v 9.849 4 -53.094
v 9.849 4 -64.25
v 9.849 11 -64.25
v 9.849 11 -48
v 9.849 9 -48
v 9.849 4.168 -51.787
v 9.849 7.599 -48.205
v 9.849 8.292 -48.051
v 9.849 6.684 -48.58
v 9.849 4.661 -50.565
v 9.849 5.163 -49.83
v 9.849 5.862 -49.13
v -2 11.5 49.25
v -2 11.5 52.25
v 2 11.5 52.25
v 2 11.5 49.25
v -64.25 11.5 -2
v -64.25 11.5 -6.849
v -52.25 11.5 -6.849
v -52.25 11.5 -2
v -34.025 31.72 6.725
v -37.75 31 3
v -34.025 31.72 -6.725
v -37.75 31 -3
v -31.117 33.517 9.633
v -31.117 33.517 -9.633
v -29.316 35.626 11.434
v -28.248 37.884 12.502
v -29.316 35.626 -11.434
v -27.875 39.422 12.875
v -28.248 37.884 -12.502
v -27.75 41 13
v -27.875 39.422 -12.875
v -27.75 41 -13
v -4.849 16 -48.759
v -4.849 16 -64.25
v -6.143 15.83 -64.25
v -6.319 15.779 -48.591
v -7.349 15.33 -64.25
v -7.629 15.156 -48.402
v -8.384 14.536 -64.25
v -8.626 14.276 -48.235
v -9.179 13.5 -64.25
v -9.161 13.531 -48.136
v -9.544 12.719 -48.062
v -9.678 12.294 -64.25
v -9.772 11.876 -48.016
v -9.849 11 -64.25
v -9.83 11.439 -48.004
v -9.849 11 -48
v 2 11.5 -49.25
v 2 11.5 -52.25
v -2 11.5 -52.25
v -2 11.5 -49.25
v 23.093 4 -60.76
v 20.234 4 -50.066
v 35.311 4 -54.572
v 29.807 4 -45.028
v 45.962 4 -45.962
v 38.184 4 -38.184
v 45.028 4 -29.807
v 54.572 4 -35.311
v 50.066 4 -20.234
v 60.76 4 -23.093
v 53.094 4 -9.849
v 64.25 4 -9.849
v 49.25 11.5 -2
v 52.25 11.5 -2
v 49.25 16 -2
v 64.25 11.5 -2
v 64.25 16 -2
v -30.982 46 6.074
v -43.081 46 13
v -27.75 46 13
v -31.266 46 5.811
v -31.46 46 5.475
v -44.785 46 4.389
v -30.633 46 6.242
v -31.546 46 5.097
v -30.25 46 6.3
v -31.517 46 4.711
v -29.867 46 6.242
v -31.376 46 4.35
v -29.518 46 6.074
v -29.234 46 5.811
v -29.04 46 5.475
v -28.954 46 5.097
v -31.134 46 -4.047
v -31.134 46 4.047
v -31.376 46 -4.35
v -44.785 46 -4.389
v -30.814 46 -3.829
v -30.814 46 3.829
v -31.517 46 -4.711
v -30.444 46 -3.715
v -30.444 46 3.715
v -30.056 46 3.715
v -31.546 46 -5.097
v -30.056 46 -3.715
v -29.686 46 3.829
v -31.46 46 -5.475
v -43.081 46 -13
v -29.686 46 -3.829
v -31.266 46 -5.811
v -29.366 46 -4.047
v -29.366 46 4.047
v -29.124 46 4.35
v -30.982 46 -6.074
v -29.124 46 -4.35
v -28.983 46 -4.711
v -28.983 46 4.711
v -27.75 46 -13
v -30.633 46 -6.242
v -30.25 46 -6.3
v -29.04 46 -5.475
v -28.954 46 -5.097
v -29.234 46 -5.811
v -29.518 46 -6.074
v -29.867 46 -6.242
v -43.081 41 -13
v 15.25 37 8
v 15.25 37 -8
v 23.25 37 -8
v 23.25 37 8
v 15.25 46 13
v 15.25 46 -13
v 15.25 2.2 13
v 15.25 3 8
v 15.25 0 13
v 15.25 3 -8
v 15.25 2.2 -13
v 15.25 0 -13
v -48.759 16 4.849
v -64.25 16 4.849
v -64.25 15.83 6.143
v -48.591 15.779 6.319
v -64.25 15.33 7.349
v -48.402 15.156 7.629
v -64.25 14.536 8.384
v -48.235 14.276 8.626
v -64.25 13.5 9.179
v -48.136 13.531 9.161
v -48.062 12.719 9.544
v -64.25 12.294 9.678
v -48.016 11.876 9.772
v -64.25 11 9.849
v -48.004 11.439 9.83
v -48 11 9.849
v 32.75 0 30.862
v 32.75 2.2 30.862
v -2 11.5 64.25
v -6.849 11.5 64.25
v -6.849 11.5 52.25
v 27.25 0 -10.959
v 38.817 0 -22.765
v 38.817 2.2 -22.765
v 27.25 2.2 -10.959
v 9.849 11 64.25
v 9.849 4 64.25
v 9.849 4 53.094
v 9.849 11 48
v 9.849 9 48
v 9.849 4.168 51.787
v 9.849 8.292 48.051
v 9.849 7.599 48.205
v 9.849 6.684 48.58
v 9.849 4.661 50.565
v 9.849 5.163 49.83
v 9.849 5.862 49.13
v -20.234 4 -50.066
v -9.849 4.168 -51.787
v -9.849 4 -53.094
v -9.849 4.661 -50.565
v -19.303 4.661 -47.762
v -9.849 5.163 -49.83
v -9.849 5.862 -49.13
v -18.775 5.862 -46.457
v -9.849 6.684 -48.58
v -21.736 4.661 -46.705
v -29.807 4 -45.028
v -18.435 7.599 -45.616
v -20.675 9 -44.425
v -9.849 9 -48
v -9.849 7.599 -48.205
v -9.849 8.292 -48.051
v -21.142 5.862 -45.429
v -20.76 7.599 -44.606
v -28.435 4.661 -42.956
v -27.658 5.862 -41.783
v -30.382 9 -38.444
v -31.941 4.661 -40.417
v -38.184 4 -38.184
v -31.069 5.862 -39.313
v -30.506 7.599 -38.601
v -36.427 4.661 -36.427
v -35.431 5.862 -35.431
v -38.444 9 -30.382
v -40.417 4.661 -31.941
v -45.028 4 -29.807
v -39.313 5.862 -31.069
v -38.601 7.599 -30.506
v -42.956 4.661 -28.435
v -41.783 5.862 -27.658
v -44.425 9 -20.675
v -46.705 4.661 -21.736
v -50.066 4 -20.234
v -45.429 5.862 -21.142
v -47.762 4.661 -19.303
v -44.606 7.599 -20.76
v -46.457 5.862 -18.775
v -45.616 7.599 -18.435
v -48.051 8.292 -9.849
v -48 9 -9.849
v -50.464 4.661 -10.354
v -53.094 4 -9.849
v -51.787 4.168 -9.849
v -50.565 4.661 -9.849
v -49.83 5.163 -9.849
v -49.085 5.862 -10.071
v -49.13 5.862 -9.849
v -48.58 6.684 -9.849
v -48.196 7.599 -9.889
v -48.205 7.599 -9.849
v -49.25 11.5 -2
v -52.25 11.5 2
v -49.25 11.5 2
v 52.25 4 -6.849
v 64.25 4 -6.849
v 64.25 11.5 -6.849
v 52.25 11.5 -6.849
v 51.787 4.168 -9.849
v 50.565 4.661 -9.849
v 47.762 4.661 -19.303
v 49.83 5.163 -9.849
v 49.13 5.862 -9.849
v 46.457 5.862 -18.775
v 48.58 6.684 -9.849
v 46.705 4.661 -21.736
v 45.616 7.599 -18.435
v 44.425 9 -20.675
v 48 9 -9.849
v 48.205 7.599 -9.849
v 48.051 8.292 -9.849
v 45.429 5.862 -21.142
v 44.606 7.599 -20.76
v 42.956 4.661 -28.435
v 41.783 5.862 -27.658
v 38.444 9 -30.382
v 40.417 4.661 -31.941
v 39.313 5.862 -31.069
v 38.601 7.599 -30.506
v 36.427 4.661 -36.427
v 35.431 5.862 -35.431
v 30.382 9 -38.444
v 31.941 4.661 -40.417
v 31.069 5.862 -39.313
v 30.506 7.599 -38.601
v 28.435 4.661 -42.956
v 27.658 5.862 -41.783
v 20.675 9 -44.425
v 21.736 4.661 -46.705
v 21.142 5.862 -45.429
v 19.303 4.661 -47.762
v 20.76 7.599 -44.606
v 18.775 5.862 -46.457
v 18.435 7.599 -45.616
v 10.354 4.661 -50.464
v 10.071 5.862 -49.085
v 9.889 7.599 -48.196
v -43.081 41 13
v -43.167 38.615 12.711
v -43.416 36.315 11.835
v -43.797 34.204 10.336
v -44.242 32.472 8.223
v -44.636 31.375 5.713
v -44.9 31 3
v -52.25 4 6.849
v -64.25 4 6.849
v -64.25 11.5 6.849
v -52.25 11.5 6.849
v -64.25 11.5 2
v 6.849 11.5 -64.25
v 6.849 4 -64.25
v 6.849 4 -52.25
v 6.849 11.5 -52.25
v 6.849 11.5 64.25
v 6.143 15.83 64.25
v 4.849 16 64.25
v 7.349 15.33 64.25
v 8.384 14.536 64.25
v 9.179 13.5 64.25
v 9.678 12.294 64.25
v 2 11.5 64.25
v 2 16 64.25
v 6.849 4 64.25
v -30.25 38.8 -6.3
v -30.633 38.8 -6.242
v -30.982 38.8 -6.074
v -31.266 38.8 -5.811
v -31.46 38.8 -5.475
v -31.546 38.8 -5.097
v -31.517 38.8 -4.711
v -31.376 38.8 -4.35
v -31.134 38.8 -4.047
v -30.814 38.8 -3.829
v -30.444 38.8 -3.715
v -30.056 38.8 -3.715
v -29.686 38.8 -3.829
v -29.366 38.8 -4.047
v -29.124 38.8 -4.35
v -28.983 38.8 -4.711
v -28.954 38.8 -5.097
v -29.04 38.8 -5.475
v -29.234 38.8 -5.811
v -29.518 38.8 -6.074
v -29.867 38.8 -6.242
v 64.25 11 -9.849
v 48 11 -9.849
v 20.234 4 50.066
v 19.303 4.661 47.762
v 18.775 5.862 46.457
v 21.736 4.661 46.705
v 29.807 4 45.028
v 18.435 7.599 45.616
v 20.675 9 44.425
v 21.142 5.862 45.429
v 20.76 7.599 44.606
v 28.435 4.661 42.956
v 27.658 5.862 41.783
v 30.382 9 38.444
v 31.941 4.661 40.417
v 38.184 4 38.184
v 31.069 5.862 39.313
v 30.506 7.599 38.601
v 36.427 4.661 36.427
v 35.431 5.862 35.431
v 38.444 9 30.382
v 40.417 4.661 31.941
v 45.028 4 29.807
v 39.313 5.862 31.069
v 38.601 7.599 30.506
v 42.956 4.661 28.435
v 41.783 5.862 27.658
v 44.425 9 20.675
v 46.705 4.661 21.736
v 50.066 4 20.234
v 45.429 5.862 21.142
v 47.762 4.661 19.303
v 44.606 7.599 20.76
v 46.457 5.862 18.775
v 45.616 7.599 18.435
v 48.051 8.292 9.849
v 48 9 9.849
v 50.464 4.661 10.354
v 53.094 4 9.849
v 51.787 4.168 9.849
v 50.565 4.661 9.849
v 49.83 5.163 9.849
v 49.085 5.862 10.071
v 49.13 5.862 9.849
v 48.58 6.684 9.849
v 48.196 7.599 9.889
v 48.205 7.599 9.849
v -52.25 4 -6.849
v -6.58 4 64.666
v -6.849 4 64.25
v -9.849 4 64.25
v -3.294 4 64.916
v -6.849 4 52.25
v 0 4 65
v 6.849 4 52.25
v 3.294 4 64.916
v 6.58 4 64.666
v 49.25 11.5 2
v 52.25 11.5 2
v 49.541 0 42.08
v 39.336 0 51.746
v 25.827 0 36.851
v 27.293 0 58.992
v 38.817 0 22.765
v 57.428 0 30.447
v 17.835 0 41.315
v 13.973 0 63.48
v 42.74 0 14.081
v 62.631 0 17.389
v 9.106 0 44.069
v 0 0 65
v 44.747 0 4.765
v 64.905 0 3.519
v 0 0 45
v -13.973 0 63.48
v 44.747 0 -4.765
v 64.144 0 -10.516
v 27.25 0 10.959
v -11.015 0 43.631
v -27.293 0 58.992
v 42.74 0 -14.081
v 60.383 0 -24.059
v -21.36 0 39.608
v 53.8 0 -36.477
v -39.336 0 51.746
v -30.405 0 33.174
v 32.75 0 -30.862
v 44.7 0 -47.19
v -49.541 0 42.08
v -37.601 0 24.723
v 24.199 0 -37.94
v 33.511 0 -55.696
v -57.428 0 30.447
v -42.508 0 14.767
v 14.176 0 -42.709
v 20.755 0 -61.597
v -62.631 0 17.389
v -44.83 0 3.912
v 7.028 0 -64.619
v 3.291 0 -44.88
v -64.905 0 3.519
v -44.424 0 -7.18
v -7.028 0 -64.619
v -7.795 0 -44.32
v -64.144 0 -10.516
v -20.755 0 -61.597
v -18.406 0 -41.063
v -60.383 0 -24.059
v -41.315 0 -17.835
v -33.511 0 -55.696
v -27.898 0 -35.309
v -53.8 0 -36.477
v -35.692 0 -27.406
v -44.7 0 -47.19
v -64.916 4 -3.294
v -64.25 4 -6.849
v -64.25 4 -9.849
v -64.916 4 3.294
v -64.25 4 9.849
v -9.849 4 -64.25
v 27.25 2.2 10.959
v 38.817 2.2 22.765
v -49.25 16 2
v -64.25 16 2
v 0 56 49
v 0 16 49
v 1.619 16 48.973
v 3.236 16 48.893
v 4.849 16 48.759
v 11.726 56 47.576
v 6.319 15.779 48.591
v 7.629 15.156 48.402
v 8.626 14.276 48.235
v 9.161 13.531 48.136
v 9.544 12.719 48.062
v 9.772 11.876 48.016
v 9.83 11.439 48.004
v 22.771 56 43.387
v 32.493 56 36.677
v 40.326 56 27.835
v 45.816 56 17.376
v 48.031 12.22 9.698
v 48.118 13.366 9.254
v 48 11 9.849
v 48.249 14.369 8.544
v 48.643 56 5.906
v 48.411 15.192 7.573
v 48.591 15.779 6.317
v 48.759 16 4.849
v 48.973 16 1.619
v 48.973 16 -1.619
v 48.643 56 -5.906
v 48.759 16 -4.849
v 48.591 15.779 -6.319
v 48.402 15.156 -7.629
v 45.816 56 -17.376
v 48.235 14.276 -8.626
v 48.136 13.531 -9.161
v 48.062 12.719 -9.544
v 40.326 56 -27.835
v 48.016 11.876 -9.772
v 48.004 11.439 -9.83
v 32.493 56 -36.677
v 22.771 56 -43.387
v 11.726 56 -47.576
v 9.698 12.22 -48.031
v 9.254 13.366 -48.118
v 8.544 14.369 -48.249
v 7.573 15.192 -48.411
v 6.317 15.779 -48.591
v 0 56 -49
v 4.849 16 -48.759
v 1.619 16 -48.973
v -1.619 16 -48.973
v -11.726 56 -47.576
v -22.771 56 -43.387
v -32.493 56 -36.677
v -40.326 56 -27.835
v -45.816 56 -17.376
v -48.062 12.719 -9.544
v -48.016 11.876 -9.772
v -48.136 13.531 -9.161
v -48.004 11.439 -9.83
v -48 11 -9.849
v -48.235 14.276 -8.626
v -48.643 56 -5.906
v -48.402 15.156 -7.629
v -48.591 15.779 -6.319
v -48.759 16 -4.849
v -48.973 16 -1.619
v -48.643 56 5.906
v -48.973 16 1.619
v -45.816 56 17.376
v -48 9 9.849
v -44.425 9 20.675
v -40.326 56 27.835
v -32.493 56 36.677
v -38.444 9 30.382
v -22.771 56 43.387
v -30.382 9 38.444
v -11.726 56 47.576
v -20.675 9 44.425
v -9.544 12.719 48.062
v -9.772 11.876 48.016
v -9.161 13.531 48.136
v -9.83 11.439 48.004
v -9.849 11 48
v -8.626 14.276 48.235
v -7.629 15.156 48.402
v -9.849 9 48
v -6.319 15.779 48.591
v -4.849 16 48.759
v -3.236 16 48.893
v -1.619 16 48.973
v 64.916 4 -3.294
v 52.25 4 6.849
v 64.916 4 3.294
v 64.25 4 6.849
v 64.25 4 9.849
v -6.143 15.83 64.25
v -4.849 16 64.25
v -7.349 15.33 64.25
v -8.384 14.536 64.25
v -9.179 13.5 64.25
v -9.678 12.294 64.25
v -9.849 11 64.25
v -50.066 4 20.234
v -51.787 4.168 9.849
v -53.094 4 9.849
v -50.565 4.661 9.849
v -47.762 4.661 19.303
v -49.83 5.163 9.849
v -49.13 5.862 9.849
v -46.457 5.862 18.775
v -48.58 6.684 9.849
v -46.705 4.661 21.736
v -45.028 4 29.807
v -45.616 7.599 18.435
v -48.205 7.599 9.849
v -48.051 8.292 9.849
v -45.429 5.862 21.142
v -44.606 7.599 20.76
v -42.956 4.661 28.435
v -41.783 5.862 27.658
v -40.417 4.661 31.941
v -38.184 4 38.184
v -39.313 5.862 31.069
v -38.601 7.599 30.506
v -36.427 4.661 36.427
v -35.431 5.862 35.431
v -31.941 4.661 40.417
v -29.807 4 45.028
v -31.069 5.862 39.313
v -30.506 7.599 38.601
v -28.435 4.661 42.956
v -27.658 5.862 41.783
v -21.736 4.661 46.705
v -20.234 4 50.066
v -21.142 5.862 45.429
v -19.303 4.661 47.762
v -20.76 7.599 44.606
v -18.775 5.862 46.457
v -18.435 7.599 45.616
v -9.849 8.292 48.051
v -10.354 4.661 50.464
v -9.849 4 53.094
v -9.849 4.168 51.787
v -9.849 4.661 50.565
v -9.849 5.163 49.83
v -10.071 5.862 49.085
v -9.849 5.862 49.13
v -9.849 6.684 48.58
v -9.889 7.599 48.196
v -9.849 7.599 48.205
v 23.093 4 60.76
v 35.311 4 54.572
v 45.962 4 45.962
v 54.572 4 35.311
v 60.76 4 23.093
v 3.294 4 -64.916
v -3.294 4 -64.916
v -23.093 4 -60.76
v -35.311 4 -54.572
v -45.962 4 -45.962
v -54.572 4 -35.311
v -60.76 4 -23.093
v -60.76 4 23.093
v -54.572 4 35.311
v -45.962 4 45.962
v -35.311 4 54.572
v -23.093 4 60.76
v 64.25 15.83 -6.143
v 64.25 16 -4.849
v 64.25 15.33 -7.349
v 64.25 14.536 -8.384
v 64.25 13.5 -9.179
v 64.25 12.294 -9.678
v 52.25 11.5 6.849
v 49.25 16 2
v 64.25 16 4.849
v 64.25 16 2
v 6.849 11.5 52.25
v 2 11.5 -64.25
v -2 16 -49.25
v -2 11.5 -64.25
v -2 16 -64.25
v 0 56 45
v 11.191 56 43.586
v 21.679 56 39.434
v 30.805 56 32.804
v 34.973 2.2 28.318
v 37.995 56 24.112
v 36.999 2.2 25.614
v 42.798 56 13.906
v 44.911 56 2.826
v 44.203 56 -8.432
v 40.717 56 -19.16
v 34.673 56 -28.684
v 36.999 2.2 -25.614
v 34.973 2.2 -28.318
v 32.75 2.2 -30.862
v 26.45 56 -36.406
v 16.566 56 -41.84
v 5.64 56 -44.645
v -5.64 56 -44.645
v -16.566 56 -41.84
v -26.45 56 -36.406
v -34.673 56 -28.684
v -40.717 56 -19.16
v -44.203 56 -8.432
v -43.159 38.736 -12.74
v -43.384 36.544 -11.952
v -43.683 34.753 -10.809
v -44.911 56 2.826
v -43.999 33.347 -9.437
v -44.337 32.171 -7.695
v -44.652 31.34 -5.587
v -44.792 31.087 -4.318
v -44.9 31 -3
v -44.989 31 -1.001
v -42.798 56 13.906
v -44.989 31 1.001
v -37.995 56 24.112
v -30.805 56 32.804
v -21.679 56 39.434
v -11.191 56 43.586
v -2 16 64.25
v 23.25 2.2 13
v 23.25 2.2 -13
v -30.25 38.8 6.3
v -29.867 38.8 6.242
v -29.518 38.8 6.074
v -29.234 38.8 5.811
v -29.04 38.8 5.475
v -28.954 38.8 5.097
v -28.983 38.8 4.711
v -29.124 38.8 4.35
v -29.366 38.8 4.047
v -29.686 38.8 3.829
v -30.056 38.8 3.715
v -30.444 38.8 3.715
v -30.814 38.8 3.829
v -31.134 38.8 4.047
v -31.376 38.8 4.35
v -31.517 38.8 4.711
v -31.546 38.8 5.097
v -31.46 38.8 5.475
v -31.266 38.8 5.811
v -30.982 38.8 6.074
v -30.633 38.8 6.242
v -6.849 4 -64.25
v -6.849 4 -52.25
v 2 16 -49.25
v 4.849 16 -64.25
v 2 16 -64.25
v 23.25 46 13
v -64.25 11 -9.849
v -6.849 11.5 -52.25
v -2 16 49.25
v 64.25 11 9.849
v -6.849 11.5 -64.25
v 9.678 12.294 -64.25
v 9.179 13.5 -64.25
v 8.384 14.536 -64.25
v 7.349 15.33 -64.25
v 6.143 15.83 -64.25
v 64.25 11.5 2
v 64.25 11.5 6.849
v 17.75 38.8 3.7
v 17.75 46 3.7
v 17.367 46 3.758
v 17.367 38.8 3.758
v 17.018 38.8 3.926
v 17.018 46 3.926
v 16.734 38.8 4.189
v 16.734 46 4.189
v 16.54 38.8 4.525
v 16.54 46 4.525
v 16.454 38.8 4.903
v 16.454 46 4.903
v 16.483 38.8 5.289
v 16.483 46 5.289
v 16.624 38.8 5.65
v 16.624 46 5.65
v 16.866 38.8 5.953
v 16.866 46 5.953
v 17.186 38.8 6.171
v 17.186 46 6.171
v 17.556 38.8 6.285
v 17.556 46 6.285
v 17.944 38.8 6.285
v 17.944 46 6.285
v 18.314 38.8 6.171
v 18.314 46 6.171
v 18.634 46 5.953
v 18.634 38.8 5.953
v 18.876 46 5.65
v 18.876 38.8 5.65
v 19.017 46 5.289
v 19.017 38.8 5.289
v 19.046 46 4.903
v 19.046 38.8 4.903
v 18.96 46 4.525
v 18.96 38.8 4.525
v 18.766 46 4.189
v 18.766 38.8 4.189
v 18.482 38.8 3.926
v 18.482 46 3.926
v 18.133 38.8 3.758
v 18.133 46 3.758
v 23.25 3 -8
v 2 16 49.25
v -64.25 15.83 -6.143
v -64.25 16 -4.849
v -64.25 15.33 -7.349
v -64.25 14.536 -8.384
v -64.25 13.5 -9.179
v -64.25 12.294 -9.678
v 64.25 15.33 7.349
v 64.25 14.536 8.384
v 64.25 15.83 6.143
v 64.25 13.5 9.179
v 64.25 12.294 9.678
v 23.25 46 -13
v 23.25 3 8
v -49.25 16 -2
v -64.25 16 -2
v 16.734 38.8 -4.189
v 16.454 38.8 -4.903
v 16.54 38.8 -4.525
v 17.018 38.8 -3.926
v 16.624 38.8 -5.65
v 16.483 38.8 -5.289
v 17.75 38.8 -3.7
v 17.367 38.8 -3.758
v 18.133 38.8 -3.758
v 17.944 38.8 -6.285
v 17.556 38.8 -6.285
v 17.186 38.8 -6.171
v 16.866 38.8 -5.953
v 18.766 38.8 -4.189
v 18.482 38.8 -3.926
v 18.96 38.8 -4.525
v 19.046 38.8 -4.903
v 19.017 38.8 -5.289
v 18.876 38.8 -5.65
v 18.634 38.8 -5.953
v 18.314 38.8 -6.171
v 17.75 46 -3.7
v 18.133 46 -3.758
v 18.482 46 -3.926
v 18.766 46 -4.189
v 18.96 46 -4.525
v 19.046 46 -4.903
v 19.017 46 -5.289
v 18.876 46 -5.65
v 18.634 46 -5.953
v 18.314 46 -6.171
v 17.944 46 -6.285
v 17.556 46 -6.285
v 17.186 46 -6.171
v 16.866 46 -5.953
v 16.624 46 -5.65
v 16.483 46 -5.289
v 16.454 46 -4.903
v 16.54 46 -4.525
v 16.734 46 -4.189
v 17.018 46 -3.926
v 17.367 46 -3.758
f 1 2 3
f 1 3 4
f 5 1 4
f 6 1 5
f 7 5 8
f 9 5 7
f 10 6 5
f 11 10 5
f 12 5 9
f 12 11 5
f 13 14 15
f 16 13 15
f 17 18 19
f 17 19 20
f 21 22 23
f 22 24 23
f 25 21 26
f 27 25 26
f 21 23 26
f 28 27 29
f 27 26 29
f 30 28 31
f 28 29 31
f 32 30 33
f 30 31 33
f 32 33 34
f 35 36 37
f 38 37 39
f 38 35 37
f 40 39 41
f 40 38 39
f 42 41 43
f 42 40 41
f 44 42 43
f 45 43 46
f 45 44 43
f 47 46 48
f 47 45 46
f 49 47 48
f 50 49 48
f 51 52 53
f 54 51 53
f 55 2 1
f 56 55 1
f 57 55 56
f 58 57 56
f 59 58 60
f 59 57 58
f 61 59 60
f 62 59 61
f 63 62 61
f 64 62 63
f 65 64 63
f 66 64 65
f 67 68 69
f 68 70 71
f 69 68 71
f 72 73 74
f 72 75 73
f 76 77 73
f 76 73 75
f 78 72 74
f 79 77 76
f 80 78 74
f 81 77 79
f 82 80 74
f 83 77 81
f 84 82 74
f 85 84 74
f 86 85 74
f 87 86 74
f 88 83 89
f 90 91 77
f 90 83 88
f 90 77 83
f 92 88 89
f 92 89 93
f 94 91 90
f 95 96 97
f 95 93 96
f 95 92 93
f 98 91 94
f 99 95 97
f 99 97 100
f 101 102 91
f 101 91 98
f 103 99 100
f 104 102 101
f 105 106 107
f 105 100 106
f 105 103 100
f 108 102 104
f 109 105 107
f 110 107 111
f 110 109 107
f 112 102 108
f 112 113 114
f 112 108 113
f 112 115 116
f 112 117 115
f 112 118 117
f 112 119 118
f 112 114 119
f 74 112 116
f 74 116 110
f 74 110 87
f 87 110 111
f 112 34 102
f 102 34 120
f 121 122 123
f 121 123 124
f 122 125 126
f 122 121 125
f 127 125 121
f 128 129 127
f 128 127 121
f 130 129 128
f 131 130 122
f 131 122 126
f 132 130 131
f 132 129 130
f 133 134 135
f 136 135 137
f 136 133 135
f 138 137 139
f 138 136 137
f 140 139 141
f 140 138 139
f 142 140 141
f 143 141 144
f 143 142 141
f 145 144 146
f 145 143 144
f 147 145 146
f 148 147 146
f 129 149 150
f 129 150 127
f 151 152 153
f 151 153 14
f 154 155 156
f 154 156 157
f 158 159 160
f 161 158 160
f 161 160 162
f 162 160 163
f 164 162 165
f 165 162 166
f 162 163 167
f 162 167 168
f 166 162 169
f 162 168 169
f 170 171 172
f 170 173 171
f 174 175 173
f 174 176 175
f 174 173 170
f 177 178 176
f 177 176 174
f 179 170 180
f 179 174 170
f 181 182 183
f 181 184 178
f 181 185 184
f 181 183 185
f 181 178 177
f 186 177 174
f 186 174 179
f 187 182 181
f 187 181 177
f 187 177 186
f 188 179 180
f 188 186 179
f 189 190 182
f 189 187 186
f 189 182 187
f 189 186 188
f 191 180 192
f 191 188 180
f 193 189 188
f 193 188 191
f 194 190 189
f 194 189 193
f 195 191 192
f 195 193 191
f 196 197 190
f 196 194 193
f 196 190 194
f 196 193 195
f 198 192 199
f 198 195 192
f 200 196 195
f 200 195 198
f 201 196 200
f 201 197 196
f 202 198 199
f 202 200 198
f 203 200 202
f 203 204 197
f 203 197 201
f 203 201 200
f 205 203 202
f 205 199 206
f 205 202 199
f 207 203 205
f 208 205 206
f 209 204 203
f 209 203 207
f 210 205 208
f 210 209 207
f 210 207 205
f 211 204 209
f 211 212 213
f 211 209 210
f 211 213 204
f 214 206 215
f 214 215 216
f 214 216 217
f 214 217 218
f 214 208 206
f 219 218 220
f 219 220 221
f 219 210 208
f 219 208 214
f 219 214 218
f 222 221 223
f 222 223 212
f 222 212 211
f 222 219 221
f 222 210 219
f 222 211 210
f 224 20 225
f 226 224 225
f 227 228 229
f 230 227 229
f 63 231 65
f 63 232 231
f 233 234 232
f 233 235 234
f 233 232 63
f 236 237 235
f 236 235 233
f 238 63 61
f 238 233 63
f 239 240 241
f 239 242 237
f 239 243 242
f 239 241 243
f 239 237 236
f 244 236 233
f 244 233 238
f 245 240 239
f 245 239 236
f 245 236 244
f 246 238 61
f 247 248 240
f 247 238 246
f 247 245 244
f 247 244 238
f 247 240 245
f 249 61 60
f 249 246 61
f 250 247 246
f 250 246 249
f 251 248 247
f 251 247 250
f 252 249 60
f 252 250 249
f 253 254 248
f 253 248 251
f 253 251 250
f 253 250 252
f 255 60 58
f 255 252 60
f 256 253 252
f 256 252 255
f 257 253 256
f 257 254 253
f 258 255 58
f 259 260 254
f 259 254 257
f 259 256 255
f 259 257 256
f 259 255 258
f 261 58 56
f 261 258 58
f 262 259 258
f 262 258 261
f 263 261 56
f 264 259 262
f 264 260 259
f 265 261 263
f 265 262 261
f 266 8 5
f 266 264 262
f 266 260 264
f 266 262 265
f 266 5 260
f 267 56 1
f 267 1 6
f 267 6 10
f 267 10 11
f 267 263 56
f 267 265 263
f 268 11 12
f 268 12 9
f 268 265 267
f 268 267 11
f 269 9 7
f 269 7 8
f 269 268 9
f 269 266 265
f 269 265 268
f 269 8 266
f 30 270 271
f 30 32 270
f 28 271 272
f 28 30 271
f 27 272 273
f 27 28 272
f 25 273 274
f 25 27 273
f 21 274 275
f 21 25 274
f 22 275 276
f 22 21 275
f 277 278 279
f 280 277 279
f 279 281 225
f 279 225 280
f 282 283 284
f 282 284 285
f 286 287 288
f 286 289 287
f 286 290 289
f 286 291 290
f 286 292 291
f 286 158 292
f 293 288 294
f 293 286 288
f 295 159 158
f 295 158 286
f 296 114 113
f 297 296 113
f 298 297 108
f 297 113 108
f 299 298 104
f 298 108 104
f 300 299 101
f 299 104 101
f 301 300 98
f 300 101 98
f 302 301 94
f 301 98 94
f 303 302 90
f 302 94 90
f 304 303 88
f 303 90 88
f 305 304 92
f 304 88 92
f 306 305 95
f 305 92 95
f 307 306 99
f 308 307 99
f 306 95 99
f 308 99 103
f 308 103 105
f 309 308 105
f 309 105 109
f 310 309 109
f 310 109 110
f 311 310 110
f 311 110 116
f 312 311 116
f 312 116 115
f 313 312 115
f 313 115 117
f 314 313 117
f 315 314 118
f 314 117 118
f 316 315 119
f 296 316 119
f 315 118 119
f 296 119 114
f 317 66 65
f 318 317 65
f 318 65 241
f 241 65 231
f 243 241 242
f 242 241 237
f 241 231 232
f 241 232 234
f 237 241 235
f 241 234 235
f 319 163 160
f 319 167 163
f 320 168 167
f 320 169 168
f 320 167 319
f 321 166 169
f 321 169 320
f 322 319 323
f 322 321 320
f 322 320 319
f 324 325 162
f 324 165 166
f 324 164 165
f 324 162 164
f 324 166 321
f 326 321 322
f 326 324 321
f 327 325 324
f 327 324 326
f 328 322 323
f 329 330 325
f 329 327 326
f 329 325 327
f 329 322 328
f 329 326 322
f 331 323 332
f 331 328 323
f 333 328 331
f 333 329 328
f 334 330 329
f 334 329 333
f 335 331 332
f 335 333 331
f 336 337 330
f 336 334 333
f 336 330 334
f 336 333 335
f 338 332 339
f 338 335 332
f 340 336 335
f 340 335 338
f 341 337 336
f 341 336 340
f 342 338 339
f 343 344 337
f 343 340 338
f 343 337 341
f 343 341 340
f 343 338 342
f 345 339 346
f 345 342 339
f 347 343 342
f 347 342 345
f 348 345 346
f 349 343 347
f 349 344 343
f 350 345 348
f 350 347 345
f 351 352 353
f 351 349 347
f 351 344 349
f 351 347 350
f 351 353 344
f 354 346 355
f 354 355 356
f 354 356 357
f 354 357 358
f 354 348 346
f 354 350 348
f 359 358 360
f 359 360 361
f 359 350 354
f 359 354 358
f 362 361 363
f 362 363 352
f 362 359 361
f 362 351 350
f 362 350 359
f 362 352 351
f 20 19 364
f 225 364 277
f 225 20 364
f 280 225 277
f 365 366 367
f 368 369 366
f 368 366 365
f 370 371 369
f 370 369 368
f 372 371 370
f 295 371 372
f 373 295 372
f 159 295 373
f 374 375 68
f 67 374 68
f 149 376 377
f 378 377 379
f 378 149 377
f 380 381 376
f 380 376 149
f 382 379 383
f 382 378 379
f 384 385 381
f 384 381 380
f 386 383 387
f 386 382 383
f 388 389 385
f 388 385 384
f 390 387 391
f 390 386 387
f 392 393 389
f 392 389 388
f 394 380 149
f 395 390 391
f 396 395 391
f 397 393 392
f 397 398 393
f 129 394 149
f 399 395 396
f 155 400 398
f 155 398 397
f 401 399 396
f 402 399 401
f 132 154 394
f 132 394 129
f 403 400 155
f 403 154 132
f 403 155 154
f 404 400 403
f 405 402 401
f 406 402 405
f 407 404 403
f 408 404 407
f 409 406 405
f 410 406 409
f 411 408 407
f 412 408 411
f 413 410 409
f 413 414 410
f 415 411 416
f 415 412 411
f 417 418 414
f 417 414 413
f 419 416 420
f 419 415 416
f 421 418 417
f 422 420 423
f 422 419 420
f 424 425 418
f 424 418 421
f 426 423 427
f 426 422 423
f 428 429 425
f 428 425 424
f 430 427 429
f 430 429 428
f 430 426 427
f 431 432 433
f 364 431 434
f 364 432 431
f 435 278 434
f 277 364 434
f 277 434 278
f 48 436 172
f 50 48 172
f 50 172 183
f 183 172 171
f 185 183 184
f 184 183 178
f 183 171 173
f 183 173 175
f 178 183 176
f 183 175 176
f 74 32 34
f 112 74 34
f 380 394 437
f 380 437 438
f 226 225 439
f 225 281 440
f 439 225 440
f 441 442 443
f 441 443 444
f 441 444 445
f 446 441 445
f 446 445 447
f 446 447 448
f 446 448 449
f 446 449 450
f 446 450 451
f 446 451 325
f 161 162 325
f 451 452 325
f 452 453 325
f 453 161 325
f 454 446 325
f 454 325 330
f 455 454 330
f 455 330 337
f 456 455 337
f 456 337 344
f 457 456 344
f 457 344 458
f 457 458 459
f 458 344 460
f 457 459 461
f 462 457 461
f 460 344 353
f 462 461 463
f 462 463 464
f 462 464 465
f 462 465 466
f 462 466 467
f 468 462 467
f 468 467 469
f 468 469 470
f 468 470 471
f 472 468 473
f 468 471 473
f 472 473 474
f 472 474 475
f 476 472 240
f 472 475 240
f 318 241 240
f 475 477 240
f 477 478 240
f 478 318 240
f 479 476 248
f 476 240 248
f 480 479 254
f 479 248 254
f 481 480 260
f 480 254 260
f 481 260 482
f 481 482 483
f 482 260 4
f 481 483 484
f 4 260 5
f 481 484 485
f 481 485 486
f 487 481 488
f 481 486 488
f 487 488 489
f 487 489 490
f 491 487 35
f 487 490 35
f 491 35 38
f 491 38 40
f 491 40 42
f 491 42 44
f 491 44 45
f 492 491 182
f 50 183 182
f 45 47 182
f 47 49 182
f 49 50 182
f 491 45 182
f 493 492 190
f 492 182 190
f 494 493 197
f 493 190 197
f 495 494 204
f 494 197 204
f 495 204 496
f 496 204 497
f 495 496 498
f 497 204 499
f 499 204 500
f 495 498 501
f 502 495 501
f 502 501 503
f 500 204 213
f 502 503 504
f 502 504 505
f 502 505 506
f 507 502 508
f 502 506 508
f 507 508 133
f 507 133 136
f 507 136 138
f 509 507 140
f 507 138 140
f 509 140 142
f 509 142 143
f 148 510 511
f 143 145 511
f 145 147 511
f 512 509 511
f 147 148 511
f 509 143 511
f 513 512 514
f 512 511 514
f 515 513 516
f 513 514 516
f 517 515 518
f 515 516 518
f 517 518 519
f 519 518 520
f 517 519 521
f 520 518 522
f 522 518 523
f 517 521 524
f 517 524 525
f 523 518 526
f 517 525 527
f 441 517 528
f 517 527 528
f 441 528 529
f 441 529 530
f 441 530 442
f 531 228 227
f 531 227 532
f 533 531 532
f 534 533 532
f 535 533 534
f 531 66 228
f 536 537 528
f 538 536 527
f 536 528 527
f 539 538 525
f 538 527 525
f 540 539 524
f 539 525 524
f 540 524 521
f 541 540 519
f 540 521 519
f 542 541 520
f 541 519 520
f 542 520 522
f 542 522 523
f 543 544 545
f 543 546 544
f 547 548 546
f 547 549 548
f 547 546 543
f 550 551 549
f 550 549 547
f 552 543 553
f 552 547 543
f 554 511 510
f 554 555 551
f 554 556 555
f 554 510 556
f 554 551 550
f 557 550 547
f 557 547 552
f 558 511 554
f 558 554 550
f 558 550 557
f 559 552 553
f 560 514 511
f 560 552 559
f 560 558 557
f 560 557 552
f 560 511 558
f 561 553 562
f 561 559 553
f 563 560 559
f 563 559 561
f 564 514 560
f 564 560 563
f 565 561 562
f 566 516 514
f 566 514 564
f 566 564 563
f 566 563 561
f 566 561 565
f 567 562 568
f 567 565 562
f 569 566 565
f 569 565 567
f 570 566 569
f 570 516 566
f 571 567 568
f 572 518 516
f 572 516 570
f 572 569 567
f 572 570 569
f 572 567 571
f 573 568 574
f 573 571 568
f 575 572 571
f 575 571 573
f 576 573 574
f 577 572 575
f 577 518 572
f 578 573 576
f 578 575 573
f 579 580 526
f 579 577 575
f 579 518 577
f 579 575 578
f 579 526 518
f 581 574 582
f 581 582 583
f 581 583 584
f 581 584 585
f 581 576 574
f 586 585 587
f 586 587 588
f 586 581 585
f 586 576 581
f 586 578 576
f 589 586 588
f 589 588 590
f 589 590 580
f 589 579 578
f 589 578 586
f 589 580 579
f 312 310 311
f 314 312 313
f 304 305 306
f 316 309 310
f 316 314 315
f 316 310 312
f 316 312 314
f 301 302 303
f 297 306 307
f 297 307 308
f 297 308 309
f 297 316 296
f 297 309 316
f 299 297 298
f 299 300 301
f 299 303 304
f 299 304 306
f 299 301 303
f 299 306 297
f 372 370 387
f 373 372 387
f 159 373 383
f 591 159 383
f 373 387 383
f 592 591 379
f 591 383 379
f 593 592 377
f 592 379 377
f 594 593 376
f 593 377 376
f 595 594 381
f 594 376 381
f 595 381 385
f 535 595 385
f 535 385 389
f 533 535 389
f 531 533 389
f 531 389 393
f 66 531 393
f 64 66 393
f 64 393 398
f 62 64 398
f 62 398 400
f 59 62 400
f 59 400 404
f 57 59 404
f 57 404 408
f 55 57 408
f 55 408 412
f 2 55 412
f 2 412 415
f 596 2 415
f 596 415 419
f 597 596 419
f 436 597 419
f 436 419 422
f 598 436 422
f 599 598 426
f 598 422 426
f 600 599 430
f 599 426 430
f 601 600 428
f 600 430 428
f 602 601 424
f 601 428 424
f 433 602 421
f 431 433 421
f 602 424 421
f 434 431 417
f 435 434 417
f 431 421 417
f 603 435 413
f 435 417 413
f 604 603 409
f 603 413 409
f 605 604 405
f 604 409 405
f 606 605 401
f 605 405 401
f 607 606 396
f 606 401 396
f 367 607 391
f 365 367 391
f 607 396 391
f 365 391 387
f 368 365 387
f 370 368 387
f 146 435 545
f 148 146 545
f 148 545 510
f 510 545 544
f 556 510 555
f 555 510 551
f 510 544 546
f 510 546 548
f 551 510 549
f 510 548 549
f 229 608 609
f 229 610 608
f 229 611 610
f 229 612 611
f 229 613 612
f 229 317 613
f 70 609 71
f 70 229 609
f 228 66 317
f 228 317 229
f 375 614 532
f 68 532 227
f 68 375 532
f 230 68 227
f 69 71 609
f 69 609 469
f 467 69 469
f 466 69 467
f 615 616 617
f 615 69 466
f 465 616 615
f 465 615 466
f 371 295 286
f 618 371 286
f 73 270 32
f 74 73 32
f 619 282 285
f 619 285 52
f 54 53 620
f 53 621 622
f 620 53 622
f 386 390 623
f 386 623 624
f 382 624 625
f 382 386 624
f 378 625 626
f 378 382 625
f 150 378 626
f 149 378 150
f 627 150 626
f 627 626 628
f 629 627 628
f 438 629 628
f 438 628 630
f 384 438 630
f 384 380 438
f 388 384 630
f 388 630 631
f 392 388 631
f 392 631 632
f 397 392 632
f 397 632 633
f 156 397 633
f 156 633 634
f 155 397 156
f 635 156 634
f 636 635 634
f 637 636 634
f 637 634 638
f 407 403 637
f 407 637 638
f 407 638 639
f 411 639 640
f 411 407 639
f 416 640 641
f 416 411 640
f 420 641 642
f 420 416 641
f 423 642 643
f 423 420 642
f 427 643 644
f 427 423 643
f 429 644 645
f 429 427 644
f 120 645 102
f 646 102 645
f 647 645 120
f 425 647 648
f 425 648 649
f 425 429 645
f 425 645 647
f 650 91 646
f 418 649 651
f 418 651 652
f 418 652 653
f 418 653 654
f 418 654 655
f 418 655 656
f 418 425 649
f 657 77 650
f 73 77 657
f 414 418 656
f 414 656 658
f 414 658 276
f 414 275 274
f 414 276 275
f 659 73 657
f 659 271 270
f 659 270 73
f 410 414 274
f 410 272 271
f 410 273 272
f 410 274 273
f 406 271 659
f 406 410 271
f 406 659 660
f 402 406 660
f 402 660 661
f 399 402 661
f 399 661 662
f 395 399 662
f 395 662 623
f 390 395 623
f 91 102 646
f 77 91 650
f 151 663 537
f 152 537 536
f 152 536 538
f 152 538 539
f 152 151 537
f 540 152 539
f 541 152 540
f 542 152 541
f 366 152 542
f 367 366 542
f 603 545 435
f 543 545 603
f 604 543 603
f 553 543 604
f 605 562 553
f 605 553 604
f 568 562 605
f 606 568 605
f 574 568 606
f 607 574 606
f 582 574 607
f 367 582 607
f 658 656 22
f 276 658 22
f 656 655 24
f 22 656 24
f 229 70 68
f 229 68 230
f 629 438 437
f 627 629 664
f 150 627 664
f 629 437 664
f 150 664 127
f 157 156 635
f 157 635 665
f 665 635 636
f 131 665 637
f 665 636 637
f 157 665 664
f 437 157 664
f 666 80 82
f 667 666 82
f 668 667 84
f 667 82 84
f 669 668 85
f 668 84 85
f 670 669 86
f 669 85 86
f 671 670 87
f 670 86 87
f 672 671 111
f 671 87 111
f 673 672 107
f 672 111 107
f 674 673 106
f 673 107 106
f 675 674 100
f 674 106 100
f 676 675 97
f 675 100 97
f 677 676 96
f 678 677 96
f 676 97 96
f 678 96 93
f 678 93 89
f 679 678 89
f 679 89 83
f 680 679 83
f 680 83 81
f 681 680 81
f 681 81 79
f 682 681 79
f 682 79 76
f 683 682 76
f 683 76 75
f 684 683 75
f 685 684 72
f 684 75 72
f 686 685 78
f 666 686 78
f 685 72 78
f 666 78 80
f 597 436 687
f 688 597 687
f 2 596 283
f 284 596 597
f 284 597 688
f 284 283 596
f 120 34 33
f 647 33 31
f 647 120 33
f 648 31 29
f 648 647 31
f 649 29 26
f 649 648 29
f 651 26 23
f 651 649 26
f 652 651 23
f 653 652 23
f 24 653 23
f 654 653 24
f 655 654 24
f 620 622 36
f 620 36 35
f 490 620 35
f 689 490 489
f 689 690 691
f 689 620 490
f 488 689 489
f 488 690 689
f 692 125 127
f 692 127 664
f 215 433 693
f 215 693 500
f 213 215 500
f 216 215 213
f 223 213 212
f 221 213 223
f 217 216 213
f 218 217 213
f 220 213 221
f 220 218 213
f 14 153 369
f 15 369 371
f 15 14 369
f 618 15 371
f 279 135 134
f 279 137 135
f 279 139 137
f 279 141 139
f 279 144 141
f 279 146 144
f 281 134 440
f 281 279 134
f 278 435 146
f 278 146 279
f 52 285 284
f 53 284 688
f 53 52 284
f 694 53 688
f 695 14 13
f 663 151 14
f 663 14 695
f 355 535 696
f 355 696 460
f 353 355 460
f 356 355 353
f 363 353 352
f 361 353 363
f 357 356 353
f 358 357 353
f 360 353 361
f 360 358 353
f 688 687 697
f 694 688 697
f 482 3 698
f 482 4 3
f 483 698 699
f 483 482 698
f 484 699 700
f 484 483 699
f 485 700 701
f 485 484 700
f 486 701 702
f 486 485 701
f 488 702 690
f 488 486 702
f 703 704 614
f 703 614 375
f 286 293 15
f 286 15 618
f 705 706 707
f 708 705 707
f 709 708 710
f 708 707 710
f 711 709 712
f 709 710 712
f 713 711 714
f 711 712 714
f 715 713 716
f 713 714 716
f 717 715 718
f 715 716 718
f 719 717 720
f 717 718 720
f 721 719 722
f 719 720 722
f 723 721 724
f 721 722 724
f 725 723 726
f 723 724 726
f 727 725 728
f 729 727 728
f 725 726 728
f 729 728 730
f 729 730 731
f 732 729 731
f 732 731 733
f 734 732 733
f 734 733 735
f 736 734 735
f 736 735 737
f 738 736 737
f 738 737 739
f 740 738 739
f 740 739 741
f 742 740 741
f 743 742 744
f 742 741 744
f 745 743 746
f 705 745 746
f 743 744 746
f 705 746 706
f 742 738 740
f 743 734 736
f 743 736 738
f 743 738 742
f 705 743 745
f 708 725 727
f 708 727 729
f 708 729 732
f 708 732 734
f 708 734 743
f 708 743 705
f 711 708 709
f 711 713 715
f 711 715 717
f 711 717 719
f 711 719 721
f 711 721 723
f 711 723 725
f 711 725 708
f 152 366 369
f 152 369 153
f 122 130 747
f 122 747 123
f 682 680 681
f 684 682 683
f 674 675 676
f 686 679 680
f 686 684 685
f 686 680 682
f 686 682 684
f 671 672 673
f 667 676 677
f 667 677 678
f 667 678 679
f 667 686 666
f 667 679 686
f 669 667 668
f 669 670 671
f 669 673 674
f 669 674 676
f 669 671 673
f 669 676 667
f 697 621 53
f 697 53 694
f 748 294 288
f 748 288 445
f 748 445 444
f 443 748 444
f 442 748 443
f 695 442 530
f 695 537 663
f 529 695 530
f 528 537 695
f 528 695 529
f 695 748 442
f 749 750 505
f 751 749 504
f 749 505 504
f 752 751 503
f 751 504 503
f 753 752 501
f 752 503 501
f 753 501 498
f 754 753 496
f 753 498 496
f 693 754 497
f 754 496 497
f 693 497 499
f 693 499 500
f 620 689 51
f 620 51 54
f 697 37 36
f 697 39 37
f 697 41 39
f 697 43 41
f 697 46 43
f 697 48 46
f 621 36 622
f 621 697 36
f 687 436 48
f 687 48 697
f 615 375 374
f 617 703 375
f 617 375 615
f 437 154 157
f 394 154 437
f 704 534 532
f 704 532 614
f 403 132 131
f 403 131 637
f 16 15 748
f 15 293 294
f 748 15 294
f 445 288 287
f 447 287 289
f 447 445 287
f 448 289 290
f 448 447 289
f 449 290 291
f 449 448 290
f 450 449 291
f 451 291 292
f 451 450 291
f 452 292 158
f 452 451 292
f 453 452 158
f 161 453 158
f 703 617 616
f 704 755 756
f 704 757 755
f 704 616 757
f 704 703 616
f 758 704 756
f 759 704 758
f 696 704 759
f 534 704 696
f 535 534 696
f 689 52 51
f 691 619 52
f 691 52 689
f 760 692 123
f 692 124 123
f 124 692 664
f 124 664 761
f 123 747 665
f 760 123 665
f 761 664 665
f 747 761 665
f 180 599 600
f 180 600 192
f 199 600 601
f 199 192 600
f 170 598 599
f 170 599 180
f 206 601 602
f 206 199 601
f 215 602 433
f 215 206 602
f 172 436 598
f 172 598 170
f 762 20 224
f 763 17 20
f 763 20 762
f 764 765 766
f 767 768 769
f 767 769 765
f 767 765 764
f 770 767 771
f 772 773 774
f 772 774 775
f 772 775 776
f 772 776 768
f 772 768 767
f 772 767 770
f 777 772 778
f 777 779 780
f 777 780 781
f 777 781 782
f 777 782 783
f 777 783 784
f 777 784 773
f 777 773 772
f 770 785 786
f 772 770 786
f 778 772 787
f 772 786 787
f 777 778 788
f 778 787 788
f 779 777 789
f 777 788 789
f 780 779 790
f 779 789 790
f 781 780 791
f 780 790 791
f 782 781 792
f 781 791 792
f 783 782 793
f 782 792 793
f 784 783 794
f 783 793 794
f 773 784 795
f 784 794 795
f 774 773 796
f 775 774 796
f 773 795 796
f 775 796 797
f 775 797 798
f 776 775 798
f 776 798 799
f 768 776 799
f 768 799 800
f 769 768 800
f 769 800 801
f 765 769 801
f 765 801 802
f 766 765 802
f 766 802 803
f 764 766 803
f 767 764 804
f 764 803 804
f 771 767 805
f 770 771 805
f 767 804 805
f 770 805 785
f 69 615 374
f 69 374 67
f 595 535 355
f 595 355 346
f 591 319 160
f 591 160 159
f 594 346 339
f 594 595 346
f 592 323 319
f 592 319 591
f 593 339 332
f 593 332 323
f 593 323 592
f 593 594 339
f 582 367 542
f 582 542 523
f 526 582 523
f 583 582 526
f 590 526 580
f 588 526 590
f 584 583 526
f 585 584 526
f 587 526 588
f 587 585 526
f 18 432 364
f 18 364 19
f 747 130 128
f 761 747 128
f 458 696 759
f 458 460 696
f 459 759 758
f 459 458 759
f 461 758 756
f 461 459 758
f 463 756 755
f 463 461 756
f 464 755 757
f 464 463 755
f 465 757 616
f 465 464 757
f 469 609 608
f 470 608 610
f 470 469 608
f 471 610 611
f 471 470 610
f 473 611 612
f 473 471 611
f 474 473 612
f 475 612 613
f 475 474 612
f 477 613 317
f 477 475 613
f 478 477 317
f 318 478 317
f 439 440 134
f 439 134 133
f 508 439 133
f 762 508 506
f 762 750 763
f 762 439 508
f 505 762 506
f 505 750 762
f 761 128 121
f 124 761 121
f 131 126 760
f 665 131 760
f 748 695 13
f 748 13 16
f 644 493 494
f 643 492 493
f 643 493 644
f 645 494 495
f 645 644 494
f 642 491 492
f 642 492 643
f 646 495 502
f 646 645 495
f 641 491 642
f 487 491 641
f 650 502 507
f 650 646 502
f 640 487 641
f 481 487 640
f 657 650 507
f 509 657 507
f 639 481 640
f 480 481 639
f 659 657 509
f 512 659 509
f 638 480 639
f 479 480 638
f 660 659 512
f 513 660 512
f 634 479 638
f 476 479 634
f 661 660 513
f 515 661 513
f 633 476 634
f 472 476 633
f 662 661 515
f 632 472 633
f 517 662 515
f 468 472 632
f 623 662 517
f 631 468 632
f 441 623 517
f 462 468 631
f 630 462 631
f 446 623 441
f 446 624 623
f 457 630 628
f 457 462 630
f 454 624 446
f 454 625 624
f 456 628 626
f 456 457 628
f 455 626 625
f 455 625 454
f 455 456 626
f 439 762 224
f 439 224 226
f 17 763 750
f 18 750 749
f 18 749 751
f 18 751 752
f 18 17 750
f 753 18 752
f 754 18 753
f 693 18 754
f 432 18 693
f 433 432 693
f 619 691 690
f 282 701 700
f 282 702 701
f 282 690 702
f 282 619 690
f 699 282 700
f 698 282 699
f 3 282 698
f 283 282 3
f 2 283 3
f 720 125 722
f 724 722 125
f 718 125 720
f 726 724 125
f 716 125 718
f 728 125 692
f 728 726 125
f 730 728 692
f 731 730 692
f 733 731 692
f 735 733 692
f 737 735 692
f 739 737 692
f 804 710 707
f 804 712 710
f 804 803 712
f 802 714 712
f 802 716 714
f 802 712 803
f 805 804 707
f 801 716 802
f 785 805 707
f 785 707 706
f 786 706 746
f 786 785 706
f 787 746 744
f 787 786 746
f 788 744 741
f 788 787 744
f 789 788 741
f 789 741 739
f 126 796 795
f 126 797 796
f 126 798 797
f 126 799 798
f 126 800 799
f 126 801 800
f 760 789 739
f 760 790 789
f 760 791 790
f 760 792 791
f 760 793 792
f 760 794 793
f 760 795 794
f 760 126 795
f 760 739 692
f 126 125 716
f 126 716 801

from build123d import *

# Parameters (mm, degrees)
CROQUIS1_R              = 49
CROQUIS1_R_2            = 45
SALIENTE_EXTRUIR1_DEPTH = 56
CROQUIS3_R              = 65
CROQUIS3_R_2            = 49
SALIENTE_EXTRUIR2_DEPTH = 4
REDONDEO1_R             = 5
CROQUIS4_W              = 8
CROQUIS4_H              = 26
SALIENTE_EXTRUIR3_DEPTH = 46
SALIENTE_EXTRUIR4_DEPTH = 2.2
SALIENTE_EXTRUIR5_START = -15
SALIENTE_EXTRUIR5_DEPTH = 15
REDONDEO2_R             = 10
CROQUIS7_R              = 1.3
CORTAR_EXTRUIR1_DEPTH   = 7.2
CORTAR_EXTRUIR2_REACH   = 119.478
CROQUIS8_W              = 16
CROQUIS8_H              = 34
CROQUIS9_W              = 16.249513617
CROQUIS9_H              = 19.697715604
SALIENTE_EXTRUIR6_DEPTH = 12
REDONDEO3_R             = 5
CROQUIS11_W             = 13.697715604
CROQUIS11_H             = 7.5
CORTAR_EXTRUIR3_DEPTH   = 12
CROQUIS12_W             = 4
CROQUIS12_H             = 4.5
CORTAR_EXTRUIR4_DEPTH   = 15
MATRIZC1_COUNT          = 4
REDONDEO3_OF_MATRIZC1_R = 5


with BuildPart() as part:
    # Croquis1 → Saliente-Extruir1 (new body)
    with BuildSketch(Plane(origin=(0, 0, 0), x_dir=(1, 0, 0), z_dir=(0, 1, 0))):
        with Locations(Location((0, 0, 0), (0, 0, 270))):
            Circle(CROQUIS1_R)
        with Locations(Location((0, 0, 0), (0, 0, 270))):
            Circle(CROQUIS1_R_2, mode=Mode.SUBTRACT)
    extrude(amount=SALIENTE_EXTRUIR1_DEPTH)

    # Croquis3 → Saliente-Extruir2 (add)
    with BuildSketch(Plane(origin=(0, 0, 0), x_dir=(1, 0, 0), z_dir=(0, 1, 0))):
        with Locations(Location((0, 0, 0), (0, 0, 270))):
            Circle(CROQUIS3_R)
        with Locations(Location((0, 0, 0), (0, 0, 270))):
            Circle(CROQUIS3_R_2, mode=Mode.SUBTRACT)
    extrude(amount=SALIENTE_EXTRUIR2_DEPTH)

    # Redondeo1
    redondeo1_edges = [part.edges().sort_by_distance(p)[0] for p in [
        (0, 4, -49),
    ]]
    fillet(redondeo1_edges, radius=REDONDEO1_R)



with BuildPart() as body_2:
    # Croquis4 → Saliente-Extruir3 (new body)
    with BuildSketch(Plane(origin=(0, 0, 0), x_dir=(1, 0, 0), z_dir=(0, 1, 0))):
        with Locations((19.25, 0)):
            Rectangle(CROQUIS4_W, CROQUIS4_H)
    extrude(amount=SALIENTE_EXTRUIR3_DEPTH)


with BuildPart() as part_1:
    add(part.part)

    add(body_2.part)  # Saliente-Extruir4 merges body 2
    # Croquis5 → Saliente-Extruir4 (add)
    with BuildSketch(Plane(origin=(0, 0, 0), x_dir=(1, 0, 0), z_dir=(0, 1, 0))):
        with BuildLine():
            Line((15.25, 13), (32.749541701, 30.86207249))
            ThreePointArc((32.749541701, 30.86207249), (36.011367089, 26.98483723), (38.816649113, 22.765494759))
            Line((38.816649113, 22.765494759), (27.25, 10.959224145))
            Line((27.25, 10.959224145), (27.25, -10.959224145))
            Line((27.25, -10.959224145), (38.816649113, -22.765494759))
            ThreePointArc((38.816649113, -22.765494759), (36.011367089, -26.98483723), (32.749541701, -30.86207249))
            Line((32.749541701, -30.86207249), (15.25, -13))
            Line((15.25, -13), (23.25, -13))
            Line((23.25, -13), (23.25, 13))
            Line((23.25, 13), (15.25, 13))
        make_face()
    extrude(amount=SALIENTE_EXTRUIR4_DEPTH)

    # Croquis6 → Saliente-Extruir5 (add)
    with BuildSketch(Plane(origin=(0, 46, 0), x_dir=(1, 0, 0), z_dir=(0, 1, 0)).offset(SALIENTE_EXTRUIR5_START)):
        with BuildLine():
            Line((-27.75, 13), (-43.081318457, 13))
            ThreePointArc((-43.081318457, 13), (-45, 0), (-43.081318457, -13))
            Line((-43.081318457, -13), (-27.75, -13))
            Line((-27.75, -13), (-27.75, 13))
        make_face()
    extrude(amount=SALIENTE_EXTRUIR5_DEPTH)

    # Redondeo2
    redondeo2_edges = [part_1.edges().sort_by_distance(p)[0] for p in [
        (-27.75, 31, 0),
        (-35.415659229, 31, 13),
        (-35.415659229, 31, -13),
    ]]
    fillet(redondeo2_edges, radius=REDONDEO2_R)

    # Croquis7 → Cortar-Extruir1 (cut)
    with BuildSketch(Plane(origin=(0, 46, 0), x_dir=(1, 0, 0), z_dir=(0, 1, 0))):
        with Locations(Location((17.75, 5, 0), (0, 0, 270))):
            Circle(CROQUIS7_R)
        with Locations(Location((17.75, -5, 0), (0, 0, 90))):
            Circle(CROQUIS7_R)
        with Locations(Location((-30.25, -5, 0), (0, 0, 270))):
            Circle(CROQUIS7_R)
        with Locations(Location((-30.25, 5, 0), (0, 0, 90))):
            Circle(CROQUIS7_R)
    extrude(amount=-CORTAR_EXTRUIR1_DEPTH, mode=Mode.SUBTRACT)

    # Croquis8 → Cortar-Extruir2 (cut, up to next)
    with BuildSketch(Plane.ZY.offset(-15.25), mode=Mode.PRIVATE) as cortar_extruir2_sk1:
        with Locations((0, 20)):
            Rectangle(CROQUIS8_W, CROQUIS8_H)
    cortar_extruir2_tool1 = extrude(cortar_extruir2_sk1.sketch, amount=-CORTAR_EXTRUIR2_REACH, mode=Mode.PRIVATE) & part_1.part
    add(cortar_extruir2_tool1.solids().sort_by_distance((15.25, 20, 0))[0], mode=Mode.SUBTRACT)

    # Croquis9 → Saliente-Extruir6 (add)
    with BuildSketch(Plane(origin=(0, 4, 0), x_dir=(1, 0, 0), z_dir=(0, 1, 0))):
        with Locations((-56.124756809, 0)):
            Rectangle(CROQUIS9_W, CROQUIS9_H)
    saliente_extruir6 = extrude(amount=SALIENTE_EXTRUIR6_DEPTH)

    # Redondeo3
    redondeo3_edges = [part_1.edges().sort_by_distance(p)[0] for p in [
        (-56.124756808, 16, -9.848857802),
        (-56.124756808, 16, 9.848857802),
    ]]
    fillet(redondeo3_edges, radius=REDONDEO3_R)

    # Croquis11 → Cortar-Extruir3 (cut)
    with BuildSketch(Plane.ZY.offset(64.249513617)):
        with Locations((0, 7.75)):
            Rectangle(CROQUIS11_W, CROQUIS11_H)
    cortar_extruir3 = extrude(amount=-CORTAR_EXTRUIR3_DEPTH, mode=Mode.SUBTRACT)

    # Croquis12 → Cortar-Extruir4 (cut)
    with BuildSketch(Plane.ZY.offset(64.249513617)):
        with Locations((0, 13.75)):
            Rectangle(CROQUIS12_W, CROQUIS12_H)
    cortar_extruir4 = extrude(amount=-CORTAR_EXTRUIR4_DEPTH, mode=Mode.SUBTRACT)

    # MatrizC1: Saliente-Extruir6, Cortar-Extruir3, Cortar-Extruir4 ×4 about axis
    matrizc1_axis = Axis((0, 0, 0), (0, 1, 0))
    add([saliente_extruir6.rotate(matrizc1_axis, i * 360 / MATRIZC1_COUNT) for i in range(1, MATRIZC1_COUNT)])
    add([cortar_extruir3.rotate(matrizc1_axis, i * 360 / MATRIZC1_COUNT) for i in range(1, MATRIZC1_COUNT)], mode=Mode.SUBTRACT)
    add([cortar_extruir4.rotate(matrizc1_axis, i * 360 / MATRIZC1_COUNT) for i in range(1, MATRIZC1_COUNT)], mode=Mode.SUBTRACT)

    # Redondeo3 of MatrizC1
    redondeo3_of_matrizc1_edges = [part_1.edges().sort_by_distance(p)[0] for p in [
        (-9.848857802, 16, 56.124756808),
        (9.848857802, 16, 56.124756808),
        (56.124756808, 16, 9.848857802),
        (56.124756808, 16, -9.848857802),
        (9.848857802, 16, -56.124756808),
        (-9.848857802, 16, -56.124756808),
    ]]
    fillet(redondeo3_of_matrizc1_edges, radius=REDONDEO3_OF_MATRIZC1_R)


solid = part_1.part
